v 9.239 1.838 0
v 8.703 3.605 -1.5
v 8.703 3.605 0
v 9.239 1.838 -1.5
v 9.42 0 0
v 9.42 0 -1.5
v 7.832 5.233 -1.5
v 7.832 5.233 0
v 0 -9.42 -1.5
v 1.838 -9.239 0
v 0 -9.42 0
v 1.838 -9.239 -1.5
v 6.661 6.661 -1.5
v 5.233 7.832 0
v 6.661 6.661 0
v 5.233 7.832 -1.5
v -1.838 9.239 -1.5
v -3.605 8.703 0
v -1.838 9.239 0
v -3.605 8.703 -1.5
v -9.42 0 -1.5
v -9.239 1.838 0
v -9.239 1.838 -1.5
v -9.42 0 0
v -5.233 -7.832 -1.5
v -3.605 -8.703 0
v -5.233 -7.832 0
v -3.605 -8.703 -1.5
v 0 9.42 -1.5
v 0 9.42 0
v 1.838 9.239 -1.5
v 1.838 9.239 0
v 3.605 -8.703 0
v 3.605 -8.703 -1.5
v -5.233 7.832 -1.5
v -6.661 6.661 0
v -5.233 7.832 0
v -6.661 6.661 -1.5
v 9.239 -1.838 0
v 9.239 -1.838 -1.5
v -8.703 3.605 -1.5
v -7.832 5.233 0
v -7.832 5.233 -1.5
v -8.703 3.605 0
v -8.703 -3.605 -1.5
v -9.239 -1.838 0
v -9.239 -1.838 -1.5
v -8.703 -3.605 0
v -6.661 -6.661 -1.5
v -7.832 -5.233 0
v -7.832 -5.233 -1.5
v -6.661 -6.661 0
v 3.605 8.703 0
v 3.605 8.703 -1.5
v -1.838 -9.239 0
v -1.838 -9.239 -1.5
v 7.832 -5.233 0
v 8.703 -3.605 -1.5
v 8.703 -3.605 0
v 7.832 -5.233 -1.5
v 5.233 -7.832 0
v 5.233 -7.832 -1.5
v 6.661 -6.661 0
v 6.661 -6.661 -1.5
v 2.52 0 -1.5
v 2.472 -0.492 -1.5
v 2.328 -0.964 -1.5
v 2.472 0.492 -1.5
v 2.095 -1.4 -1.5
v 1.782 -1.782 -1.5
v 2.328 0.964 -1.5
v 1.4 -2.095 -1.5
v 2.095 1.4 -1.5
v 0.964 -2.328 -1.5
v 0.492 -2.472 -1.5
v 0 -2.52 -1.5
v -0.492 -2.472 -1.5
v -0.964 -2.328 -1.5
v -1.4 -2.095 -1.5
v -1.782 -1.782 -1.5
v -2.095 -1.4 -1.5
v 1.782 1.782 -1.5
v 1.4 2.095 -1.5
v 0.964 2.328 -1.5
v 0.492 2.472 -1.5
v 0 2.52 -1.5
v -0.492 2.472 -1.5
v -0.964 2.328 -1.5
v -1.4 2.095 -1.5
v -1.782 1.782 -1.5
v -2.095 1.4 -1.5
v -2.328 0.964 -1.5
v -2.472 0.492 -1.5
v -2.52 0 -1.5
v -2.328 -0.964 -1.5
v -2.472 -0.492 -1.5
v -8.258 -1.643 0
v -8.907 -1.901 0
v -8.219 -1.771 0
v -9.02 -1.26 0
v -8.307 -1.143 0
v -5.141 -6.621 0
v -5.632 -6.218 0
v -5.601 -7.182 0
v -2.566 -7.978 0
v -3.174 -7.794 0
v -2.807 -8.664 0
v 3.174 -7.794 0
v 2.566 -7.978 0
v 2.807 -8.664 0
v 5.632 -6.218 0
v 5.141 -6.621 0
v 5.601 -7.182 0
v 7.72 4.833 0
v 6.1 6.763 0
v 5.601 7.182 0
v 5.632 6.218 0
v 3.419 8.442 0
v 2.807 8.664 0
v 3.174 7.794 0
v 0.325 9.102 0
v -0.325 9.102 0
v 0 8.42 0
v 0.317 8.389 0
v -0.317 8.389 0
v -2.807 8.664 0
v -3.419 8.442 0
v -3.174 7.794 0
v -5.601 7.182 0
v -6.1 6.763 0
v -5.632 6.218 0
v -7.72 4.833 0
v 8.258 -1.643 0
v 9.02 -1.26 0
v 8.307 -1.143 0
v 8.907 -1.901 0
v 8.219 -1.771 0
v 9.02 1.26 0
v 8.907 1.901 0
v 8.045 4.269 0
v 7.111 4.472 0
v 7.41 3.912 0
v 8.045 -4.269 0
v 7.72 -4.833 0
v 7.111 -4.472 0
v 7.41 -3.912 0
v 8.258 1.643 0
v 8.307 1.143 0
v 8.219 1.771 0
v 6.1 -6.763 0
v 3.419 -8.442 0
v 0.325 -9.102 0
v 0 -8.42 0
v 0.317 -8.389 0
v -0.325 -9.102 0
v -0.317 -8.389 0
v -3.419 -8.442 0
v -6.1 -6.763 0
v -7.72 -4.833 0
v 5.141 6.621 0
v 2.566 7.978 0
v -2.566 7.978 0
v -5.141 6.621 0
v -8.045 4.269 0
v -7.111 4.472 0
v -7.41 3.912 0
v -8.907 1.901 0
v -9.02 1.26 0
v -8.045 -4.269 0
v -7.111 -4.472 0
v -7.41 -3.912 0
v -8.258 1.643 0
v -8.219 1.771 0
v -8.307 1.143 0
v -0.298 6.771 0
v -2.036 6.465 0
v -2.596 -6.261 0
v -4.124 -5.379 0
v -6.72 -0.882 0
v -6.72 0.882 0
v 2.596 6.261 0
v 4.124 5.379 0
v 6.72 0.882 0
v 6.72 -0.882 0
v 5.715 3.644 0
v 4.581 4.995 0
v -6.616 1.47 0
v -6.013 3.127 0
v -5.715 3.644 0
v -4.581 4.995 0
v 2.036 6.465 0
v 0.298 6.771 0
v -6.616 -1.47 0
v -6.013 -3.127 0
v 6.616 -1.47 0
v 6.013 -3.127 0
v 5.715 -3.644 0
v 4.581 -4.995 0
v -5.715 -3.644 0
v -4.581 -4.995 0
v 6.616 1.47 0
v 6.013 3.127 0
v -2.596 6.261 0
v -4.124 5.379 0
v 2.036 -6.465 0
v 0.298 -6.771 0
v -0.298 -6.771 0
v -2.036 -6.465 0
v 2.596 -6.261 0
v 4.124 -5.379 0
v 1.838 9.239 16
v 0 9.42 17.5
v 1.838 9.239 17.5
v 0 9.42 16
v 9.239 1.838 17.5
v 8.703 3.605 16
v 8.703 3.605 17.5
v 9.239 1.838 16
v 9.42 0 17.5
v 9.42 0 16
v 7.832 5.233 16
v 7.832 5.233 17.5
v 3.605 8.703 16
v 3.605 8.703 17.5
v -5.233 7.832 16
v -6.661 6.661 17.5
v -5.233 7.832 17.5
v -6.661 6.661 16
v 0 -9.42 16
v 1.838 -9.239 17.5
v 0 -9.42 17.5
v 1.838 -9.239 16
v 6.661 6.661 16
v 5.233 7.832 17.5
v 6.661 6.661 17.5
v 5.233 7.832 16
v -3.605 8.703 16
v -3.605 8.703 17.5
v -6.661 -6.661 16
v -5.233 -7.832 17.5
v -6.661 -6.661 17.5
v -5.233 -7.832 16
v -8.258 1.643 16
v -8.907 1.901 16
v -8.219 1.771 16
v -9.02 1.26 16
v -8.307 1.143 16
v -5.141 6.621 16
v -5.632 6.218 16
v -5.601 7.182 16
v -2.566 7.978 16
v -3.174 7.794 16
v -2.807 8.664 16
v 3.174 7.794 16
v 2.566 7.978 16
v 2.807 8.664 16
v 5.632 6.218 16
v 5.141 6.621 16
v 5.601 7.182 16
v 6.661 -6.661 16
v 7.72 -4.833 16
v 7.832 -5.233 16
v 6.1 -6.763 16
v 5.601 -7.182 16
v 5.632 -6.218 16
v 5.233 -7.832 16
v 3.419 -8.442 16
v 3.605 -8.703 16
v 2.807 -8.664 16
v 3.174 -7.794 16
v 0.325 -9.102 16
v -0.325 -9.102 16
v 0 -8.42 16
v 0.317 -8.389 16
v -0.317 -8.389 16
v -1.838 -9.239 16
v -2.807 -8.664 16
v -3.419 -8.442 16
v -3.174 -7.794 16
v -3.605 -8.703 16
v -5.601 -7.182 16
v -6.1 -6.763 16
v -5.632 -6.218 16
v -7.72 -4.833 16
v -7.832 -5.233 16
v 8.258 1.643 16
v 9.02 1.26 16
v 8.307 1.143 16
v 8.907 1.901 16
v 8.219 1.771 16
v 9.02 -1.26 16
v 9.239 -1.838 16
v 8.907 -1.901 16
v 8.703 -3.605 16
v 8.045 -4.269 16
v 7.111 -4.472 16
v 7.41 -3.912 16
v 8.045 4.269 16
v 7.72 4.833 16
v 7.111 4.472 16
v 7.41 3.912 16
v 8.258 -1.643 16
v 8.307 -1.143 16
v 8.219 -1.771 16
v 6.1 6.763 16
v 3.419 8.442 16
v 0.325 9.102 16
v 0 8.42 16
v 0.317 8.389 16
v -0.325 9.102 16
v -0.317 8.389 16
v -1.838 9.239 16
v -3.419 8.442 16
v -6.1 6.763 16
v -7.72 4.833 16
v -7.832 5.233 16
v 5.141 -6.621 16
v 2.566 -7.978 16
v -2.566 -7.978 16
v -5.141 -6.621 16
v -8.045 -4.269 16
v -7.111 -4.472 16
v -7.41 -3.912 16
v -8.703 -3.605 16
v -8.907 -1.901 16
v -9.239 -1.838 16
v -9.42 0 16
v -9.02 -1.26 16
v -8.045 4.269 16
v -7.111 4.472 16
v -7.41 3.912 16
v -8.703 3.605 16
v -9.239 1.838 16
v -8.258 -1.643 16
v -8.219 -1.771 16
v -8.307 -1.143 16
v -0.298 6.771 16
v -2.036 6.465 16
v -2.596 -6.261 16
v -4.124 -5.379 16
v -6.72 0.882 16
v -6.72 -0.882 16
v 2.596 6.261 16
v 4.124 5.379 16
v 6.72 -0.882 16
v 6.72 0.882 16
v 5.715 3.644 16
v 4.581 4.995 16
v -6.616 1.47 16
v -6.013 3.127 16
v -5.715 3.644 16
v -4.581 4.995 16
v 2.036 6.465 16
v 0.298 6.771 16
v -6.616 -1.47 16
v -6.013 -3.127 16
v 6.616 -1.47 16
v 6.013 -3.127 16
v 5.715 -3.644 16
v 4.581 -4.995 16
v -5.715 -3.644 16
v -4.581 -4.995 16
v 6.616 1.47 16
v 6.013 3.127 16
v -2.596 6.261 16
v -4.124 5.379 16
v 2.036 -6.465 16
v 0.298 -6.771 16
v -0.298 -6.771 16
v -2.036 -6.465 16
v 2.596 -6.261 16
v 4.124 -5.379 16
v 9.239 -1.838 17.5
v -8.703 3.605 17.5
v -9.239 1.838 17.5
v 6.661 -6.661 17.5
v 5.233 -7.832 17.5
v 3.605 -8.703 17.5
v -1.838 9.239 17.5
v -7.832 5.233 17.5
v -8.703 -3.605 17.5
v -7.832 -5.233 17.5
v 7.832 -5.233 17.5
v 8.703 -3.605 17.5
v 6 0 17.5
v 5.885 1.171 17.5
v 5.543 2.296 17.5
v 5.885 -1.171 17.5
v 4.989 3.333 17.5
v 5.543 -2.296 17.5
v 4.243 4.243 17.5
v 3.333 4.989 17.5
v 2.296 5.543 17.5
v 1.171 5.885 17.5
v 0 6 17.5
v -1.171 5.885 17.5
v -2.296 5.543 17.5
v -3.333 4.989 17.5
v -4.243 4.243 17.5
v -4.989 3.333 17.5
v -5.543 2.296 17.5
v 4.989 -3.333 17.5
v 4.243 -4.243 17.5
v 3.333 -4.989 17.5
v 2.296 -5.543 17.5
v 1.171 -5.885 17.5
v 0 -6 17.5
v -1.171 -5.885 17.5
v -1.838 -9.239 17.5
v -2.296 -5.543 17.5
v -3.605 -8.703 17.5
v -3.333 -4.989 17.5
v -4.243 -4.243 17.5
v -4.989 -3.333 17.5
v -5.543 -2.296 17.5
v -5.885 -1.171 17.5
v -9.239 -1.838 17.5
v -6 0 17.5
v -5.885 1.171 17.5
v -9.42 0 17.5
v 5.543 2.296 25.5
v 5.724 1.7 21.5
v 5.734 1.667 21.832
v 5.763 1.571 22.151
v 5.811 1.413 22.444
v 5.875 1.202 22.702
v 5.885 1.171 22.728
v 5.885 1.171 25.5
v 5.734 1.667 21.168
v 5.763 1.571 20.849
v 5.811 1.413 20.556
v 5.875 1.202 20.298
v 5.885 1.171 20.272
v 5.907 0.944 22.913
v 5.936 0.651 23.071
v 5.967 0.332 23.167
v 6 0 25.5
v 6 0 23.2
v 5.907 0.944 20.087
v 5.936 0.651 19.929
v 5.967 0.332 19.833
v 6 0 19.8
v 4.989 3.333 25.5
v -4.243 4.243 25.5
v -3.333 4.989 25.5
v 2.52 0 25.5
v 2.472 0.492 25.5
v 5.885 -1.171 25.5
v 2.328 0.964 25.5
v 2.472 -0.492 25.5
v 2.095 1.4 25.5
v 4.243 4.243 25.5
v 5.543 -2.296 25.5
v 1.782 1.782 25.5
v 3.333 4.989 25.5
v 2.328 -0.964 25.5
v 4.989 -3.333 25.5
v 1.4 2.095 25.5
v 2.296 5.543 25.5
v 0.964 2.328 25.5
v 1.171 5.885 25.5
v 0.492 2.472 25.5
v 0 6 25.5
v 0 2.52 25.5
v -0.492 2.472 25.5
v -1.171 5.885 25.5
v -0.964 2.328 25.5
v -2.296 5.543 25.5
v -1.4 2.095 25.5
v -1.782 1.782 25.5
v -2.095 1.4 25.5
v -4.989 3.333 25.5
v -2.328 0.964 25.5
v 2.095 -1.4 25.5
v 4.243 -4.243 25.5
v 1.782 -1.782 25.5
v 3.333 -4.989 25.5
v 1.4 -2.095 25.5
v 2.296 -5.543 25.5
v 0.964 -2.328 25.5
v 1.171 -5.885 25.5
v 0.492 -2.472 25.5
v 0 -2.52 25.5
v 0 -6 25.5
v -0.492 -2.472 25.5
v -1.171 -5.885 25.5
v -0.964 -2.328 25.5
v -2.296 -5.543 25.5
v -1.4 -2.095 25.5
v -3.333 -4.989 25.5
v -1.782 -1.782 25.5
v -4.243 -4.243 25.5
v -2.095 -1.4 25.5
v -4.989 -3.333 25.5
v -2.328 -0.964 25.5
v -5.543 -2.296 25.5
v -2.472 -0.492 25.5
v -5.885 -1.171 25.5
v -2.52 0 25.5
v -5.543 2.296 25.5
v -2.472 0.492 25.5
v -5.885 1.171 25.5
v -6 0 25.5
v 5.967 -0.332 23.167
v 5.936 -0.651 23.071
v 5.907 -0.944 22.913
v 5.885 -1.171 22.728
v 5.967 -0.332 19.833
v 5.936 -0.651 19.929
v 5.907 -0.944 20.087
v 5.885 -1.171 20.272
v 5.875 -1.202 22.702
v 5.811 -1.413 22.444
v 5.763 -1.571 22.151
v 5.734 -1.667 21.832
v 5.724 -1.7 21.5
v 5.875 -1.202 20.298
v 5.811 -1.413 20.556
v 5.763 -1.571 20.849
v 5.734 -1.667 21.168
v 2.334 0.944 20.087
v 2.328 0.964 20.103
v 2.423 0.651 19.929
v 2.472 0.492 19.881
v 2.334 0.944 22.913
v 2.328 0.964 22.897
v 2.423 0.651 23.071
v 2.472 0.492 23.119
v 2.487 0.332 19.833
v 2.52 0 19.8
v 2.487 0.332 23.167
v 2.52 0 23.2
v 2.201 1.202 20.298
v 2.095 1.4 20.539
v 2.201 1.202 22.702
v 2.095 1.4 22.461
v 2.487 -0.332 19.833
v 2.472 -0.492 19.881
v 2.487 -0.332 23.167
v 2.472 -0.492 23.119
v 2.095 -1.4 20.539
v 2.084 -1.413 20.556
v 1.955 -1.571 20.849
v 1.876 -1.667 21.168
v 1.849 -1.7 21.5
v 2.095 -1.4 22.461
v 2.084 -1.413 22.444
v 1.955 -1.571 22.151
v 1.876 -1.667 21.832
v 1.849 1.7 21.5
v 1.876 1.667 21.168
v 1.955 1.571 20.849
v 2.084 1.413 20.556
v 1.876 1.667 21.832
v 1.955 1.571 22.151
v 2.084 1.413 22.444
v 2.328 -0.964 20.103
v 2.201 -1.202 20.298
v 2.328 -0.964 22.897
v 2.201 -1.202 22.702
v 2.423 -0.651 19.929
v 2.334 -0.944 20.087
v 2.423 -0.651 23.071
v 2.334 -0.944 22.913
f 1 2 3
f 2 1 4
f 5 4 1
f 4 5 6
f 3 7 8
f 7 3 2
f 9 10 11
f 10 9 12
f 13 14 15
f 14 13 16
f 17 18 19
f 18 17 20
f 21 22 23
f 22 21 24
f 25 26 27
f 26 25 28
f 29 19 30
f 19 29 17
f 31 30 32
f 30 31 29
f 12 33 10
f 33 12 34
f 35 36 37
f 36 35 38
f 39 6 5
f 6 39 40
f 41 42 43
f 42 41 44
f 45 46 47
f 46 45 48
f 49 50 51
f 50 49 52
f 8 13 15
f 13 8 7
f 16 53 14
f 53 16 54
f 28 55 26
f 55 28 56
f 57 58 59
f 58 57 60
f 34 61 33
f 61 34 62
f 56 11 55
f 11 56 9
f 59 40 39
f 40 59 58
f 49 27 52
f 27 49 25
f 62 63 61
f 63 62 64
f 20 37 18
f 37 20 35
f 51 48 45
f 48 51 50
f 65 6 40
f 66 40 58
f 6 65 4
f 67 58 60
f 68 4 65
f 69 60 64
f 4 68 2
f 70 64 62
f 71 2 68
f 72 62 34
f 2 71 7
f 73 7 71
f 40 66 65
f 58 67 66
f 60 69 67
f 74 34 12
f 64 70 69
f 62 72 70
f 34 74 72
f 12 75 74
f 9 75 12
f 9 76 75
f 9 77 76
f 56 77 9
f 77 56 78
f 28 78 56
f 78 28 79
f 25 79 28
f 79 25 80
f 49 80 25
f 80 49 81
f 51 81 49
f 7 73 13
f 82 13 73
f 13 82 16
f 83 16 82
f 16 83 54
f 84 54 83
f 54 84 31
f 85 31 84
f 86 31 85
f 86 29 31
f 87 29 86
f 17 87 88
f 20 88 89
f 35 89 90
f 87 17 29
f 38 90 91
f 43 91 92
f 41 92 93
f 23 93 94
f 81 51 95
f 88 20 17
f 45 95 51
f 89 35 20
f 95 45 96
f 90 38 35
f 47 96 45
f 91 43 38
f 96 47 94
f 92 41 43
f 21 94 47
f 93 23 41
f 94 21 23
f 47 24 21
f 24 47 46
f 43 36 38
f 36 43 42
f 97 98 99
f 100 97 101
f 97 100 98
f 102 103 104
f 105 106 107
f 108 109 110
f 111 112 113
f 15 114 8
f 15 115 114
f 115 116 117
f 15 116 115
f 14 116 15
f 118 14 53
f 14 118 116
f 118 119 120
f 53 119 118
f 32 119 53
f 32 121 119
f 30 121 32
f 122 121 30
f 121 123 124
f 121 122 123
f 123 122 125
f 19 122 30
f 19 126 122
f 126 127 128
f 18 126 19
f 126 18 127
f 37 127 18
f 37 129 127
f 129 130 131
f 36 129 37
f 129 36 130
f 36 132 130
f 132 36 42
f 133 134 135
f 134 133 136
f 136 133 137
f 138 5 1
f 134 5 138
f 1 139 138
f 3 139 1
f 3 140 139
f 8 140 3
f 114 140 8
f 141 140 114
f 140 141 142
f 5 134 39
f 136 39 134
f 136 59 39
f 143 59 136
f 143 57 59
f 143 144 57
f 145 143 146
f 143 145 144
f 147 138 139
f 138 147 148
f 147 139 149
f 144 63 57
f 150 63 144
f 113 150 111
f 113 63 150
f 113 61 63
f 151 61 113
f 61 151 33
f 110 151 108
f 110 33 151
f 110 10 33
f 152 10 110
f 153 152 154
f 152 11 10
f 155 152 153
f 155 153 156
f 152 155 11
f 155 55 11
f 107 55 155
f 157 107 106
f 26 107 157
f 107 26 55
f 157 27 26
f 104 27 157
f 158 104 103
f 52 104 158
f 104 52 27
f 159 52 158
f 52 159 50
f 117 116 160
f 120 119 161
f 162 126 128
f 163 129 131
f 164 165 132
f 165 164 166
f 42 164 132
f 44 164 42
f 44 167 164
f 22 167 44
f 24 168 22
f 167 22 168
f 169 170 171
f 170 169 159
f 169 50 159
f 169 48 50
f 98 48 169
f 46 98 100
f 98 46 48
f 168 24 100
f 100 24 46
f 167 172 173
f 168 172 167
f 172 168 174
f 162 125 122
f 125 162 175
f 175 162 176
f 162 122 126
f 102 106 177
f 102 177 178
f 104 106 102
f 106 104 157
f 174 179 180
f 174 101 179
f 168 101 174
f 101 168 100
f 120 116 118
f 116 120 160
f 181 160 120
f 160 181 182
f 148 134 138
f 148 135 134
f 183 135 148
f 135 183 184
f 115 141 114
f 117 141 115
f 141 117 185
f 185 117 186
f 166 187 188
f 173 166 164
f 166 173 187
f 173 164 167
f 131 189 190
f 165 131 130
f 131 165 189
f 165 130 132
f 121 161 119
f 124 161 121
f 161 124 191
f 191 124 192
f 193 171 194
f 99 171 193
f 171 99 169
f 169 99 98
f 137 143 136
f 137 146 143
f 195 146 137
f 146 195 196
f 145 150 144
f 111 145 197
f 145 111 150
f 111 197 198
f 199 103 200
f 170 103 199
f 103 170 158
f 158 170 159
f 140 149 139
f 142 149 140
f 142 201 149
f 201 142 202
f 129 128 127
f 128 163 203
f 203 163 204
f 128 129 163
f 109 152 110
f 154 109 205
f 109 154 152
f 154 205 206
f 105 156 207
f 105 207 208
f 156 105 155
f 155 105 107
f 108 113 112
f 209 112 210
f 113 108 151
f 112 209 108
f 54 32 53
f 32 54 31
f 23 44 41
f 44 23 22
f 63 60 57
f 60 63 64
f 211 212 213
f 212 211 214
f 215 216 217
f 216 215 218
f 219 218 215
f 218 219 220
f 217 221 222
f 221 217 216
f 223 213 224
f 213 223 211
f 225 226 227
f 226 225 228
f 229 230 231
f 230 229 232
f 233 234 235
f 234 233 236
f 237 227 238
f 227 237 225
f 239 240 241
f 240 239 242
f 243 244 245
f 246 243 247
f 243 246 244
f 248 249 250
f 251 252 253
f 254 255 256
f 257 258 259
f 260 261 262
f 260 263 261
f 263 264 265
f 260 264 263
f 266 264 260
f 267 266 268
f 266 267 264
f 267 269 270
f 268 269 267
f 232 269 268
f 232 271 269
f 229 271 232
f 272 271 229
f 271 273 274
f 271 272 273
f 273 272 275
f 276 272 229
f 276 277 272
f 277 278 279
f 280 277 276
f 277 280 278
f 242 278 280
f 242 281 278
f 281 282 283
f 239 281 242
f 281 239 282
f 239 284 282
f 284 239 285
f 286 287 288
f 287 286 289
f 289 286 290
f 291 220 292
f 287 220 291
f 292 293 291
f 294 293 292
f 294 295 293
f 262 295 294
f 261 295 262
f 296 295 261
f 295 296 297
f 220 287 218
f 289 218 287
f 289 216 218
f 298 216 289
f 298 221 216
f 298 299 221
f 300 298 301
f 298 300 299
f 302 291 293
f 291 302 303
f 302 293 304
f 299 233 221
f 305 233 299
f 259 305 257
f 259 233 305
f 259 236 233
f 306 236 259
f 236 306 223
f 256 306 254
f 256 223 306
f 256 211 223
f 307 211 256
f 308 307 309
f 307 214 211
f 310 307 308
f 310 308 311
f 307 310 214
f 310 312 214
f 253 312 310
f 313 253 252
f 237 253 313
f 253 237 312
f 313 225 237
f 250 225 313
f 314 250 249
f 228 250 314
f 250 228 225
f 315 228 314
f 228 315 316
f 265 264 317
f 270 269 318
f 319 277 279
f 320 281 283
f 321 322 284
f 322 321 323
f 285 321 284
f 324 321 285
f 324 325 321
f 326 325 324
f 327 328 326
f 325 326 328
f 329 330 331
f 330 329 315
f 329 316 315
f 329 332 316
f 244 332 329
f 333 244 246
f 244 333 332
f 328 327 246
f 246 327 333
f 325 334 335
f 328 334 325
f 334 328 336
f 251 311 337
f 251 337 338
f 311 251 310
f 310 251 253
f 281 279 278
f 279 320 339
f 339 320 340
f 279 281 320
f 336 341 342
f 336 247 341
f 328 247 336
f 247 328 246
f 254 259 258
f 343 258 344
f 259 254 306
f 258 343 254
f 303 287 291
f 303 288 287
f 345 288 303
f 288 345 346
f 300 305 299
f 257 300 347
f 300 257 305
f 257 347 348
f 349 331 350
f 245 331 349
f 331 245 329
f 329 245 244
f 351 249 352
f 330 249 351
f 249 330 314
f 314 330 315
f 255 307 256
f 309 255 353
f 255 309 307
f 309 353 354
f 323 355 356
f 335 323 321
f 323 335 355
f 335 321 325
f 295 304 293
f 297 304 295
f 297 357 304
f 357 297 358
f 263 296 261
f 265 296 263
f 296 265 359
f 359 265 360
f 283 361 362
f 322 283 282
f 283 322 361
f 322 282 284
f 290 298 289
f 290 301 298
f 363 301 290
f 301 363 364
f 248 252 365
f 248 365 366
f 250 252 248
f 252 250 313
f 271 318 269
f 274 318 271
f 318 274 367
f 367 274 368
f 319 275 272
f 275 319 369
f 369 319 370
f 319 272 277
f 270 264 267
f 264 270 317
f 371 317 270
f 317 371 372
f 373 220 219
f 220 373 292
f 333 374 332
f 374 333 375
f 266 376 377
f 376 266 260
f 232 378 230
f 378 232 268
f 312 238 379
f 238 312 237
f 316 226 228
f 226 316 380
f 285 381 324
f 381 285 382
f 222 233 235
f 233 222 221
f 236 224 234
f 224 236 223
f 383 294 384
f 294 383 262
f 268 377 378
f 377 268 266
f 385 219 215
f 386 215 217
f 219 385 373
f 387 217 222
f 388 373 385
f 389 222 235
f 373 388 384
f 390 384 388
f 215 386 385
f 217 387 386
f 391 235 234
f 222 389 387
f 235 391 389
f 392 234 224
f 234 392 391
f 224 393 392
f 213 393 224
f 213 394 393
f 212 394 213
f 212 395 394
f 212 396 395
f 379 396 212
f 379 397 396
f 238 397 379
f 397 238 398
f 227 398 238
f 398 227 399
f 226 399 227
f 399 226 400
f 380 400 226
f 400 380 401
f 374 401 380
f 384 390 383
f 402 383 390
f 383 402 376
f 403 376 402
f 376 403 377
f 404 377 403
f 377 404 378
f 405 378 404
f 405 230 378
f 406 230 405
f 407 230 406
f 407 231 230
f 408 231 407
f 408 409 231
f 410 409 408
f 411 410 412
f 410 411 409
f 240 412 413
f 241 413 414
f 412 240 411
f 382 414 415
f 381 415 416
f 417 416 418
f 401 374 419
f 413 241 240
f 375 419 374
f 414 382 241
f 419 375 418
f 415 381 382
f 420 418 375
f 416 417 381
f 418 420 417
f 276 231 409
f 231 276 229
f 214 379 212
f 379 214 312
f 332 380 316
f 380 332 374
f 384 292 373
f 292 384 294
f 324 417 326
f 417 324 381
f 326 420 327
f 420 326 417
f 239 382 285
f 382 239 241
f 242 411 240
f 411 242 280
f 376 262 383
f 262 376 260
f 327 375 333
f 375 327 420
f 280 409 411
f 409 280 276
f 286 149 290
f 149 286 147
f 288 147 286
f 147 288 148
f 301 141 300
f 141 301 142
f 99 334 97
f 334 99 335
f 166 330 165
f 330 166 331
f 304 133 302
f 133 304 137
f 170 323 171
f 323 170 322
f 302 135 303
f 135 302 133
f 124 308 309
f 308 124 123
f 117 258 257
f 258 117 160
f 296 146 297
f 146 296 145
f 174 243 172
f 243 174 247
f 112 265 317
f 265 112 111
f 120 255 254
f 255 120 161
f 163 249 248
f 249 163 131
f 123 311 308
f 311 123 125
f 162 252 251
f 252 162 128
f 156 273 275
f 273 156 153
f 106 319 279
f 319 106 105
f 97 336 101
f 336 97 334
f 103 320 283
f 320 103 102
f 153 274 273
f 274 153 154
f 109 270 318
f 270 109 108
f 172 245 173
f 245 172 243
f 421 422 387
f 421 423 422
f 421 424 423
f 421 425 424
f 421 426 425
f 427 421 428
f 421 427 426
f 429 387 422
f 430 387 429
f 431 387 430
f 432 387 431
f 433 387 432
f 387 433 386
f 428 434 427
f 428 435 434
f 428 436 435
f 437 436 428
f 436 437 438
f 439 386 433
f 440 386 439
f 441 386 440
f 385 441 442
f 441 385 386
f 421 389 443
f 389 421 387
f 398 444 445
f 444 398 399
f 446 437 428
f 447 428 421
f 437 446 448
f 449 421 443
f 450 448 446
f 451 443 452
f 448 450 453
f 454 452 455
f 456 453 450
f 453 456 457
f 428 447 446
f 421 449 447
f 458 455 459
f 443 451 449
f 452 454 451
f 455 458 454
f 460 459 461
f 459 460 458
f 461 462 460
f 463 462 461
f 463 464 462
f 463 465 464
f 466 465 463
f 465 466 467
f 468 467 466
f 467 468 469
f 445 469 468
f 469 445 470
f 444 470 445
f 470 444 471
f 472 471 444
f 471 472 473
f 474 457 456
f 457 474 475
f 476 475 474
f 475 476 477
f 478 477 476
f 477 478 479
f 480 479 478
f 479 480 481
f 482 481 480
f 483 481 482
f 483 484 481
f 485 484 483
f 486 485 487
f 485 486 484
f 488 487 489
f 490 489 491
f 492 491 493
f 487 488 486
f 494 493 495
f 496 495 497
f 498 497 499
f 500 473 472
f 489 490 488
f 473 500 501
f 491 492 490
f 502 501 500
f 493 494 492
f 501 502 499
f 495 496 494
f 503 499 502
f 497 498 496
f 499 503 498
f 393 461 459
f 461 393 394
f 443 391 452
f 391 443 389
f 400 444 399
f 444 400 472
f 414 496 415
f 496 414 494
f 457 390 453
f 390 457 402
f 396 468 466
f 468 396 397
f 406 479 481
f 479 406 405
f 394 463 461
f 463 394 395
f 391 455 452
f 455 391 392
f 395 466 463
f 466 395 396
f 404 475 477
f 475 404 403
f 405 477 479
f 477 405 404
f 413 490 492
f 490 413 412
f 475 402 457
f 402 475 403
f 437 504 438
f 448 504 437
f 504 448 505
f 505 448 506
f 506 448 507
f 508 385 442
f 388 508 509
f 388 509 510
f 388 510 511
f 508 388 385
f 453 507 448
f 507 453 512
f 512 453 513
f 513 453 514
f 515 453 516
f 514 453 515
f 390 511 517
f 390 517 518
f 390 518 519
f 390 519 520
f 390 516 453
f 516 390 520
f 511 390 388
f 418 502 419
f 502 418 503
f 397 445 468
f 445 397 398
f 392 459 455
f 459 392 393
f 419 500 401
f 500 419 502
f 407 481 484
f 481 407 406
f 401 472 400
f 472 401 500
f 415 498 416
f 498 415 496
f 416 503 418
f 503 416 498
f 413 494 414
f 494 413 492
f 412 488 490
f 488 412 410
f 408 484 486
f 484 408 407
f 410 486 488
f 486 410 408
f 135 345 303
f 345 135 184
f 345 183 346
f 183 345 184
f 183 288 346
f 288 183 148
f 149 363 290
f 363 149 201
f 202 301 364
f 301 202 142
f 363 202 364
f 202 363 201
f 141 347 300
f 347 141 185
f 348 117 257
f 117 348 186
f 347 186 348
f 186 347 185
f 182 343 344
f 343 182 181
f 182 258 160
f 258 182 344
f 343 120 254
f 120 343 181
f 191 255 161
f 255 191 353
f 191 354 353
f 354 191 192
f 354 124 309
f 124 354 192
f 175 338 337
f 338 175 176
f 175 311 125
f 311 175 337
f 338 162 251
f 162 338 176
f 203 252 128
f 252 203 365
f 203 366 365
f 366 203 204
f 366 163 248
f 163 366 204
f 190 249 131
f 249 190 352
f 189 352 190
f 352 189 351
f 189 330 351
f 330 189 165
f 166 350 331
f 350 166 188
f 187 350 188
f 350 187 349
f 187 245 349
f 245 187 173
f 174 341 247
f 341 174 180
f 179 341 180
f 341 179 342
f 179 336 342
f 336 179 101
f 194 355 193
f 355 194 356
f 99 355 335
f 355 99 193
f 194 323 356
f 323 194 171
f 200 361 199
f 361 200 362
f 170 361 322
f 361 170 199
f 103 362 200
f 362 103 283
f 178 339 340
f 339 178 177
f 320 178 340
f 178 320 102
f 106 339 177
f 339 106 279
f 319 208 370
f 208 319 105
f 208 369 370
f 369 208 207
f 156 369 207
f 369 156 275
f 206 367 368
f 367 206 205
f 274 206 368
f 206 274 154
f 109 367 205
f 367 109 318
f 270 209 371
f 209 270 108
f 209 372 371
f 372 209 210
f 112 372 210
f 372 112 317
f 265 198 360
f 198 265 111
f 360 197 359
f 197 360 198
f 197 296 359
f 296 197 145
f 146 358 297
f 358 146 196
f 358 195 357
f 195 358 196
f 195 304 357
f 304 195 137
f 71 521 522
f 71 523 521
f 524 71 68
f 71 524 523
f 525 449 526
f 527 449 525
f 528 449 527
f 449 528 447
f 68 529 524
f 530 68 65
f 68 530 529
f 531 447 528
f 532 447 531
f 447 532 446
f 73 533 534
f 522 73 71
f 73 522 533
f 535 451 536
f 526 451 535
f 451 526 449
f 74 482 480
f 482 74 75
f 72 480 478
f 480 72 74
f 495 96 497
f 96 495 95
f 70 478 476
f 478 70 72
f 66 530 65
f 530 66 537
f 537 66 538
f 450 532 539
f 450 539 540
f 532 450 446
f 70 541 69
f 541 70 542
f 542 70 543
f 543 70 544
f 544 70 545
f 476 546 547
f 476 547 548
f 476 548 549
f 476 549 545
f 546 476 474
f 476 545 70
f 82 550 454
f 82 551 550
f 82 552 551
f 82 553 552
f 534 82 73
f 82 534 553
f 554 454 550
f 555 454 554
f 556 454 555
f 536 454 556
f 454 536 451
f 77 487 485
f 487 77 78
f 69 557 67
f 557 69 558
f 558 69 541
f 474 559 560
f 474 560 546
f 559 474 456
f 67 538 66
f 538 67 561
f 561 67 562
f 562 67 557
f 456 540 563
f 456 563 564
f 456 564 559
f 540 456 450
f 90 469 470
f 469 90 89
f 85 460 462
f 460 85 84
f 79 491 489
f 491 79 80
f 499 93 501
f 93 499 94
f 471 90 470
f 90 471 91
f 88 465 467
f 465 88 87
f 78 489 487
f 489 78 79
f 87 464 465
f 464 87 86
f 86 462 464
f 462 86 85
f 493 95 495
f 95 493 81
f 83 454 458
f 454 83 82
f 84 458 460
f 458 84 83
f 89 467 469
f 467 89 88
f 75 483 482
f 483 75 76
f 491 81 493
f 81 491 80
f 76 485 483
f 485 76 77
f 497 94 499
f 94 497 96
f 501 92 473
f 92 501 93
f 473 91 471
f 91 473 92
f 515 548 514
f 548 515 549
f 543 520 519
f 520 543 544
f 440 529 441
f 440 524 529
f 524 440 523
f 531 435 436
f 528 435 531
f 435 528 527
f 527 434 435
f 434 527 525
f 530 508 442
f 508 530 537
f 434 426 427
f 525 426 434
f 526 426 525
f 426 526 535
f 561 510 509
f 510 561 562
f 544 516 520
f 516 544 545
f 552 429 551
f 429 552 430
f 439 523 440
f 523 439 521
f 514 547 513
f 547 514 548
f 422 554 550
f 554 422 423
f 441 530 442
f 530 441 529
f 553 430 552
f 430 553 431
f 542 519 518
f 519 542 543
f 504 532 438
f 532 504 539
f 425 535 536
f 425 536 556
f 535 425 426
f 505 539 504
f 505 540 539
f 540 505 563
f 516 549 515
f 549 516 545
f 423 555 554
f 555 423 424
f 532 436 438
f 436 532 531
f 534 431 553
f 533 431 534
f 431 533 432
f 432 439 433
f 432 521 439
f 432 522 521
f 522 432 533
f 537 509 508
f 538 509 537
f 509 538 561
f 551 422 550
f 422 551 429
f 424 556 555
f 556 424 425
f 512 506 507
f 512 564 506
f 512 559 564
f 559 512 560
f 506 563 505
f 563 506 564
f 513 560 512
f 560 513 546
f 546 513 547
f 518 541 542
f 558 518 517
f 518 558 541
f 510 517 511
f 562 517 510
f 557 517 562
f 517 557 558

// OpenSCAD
$fn = 32;

// ----------------------------------------------------------------------
// Timing pulley: GT3 18T, pitch 3 mm, 18.84 mm x 27 mm
// ----------------------------------------------------------------------

// --- parameters (mm) ---
belt_pitch = 3;           // belt pitch
n_teeth = 18;             // number of grooves
rim_w = 16;               // belt width between the flanges
tip_d = 16.84;            // tip circle diameter
root_d = 14.64;           // groove bottom diameter
groove_h = 1.1;           // groove depth
tooth_w = 2.1;            // groove width at the tip circle
rim_d = 18.84;            // flange diameter
rim_t = 1.5;              // flange thickness
spigot_d = 13.04;         // flange spigot, sunk into the rim
spigot_h = 1.2;           // spigot depth into the rim
shaft_d = 5.04;           // shaft bore
hub_d = 12;               // hub diameter
hub_h = 8;                // hub above the flange
bottom_z = -1.5;          // lowest point of the pulley
top_z = 25.5;             // highest point of the pulley
set_d = 3.4;              // set screw tap hole

module rim() {
  cylinder(h = rim_w, d = tip_d);
}

module groove_cutter() {
  /* belt tooth groove: deeper than wide, cut through the belt width */
  translate([root_d / 2, 0, 0])
    linear_extrude(height = rim_w)
      polygon(points = [[-0.6, -tooth_w * 0.42], [groove_h + 0.6, -tooth_w * 0.6],
                        [groove_h + 0.6, tooth_w * 0.6], [-0.6, tooth_w * 0.42]]);
}

module flanges() {
  translate([0, 0, -rim_t]) cylinder(h = rim_t, d = rim_d);
  translate([0, 0, rim_w]) cylinder(h = rim_t, d = rim_d);
  translate([0, 0, -spigot_h]) cylinder(h = spigot_h + 0.6, d = spigot_d);
  translate([0, 0, rim_w - 0.6]) cylinder(h = spigot_h + 0.6, d = spigot_d);
}

module hub() {
  translate([0, 0, bottom_z]) cylinder(h = top_z - bottom_z, d = hub_d);
}

difference() {
  union() {
    rim();
    hub();
    flanges();
  }
  for (i = [0 : n_teeth - 1]) rotate([0, 0, i * 360 / n_teeth]) groove_cutter();
  translate([0, 0, bottom_z - 1]) cylinder(h = top_z - bottom_z + 2, d = shaft_d);
  translate([-1, 0, top_z - hub_h * 0.5]) rotate([0, 90, 0]) cylinder(h = hub_d / 2 + 3, d = set_d);
}
